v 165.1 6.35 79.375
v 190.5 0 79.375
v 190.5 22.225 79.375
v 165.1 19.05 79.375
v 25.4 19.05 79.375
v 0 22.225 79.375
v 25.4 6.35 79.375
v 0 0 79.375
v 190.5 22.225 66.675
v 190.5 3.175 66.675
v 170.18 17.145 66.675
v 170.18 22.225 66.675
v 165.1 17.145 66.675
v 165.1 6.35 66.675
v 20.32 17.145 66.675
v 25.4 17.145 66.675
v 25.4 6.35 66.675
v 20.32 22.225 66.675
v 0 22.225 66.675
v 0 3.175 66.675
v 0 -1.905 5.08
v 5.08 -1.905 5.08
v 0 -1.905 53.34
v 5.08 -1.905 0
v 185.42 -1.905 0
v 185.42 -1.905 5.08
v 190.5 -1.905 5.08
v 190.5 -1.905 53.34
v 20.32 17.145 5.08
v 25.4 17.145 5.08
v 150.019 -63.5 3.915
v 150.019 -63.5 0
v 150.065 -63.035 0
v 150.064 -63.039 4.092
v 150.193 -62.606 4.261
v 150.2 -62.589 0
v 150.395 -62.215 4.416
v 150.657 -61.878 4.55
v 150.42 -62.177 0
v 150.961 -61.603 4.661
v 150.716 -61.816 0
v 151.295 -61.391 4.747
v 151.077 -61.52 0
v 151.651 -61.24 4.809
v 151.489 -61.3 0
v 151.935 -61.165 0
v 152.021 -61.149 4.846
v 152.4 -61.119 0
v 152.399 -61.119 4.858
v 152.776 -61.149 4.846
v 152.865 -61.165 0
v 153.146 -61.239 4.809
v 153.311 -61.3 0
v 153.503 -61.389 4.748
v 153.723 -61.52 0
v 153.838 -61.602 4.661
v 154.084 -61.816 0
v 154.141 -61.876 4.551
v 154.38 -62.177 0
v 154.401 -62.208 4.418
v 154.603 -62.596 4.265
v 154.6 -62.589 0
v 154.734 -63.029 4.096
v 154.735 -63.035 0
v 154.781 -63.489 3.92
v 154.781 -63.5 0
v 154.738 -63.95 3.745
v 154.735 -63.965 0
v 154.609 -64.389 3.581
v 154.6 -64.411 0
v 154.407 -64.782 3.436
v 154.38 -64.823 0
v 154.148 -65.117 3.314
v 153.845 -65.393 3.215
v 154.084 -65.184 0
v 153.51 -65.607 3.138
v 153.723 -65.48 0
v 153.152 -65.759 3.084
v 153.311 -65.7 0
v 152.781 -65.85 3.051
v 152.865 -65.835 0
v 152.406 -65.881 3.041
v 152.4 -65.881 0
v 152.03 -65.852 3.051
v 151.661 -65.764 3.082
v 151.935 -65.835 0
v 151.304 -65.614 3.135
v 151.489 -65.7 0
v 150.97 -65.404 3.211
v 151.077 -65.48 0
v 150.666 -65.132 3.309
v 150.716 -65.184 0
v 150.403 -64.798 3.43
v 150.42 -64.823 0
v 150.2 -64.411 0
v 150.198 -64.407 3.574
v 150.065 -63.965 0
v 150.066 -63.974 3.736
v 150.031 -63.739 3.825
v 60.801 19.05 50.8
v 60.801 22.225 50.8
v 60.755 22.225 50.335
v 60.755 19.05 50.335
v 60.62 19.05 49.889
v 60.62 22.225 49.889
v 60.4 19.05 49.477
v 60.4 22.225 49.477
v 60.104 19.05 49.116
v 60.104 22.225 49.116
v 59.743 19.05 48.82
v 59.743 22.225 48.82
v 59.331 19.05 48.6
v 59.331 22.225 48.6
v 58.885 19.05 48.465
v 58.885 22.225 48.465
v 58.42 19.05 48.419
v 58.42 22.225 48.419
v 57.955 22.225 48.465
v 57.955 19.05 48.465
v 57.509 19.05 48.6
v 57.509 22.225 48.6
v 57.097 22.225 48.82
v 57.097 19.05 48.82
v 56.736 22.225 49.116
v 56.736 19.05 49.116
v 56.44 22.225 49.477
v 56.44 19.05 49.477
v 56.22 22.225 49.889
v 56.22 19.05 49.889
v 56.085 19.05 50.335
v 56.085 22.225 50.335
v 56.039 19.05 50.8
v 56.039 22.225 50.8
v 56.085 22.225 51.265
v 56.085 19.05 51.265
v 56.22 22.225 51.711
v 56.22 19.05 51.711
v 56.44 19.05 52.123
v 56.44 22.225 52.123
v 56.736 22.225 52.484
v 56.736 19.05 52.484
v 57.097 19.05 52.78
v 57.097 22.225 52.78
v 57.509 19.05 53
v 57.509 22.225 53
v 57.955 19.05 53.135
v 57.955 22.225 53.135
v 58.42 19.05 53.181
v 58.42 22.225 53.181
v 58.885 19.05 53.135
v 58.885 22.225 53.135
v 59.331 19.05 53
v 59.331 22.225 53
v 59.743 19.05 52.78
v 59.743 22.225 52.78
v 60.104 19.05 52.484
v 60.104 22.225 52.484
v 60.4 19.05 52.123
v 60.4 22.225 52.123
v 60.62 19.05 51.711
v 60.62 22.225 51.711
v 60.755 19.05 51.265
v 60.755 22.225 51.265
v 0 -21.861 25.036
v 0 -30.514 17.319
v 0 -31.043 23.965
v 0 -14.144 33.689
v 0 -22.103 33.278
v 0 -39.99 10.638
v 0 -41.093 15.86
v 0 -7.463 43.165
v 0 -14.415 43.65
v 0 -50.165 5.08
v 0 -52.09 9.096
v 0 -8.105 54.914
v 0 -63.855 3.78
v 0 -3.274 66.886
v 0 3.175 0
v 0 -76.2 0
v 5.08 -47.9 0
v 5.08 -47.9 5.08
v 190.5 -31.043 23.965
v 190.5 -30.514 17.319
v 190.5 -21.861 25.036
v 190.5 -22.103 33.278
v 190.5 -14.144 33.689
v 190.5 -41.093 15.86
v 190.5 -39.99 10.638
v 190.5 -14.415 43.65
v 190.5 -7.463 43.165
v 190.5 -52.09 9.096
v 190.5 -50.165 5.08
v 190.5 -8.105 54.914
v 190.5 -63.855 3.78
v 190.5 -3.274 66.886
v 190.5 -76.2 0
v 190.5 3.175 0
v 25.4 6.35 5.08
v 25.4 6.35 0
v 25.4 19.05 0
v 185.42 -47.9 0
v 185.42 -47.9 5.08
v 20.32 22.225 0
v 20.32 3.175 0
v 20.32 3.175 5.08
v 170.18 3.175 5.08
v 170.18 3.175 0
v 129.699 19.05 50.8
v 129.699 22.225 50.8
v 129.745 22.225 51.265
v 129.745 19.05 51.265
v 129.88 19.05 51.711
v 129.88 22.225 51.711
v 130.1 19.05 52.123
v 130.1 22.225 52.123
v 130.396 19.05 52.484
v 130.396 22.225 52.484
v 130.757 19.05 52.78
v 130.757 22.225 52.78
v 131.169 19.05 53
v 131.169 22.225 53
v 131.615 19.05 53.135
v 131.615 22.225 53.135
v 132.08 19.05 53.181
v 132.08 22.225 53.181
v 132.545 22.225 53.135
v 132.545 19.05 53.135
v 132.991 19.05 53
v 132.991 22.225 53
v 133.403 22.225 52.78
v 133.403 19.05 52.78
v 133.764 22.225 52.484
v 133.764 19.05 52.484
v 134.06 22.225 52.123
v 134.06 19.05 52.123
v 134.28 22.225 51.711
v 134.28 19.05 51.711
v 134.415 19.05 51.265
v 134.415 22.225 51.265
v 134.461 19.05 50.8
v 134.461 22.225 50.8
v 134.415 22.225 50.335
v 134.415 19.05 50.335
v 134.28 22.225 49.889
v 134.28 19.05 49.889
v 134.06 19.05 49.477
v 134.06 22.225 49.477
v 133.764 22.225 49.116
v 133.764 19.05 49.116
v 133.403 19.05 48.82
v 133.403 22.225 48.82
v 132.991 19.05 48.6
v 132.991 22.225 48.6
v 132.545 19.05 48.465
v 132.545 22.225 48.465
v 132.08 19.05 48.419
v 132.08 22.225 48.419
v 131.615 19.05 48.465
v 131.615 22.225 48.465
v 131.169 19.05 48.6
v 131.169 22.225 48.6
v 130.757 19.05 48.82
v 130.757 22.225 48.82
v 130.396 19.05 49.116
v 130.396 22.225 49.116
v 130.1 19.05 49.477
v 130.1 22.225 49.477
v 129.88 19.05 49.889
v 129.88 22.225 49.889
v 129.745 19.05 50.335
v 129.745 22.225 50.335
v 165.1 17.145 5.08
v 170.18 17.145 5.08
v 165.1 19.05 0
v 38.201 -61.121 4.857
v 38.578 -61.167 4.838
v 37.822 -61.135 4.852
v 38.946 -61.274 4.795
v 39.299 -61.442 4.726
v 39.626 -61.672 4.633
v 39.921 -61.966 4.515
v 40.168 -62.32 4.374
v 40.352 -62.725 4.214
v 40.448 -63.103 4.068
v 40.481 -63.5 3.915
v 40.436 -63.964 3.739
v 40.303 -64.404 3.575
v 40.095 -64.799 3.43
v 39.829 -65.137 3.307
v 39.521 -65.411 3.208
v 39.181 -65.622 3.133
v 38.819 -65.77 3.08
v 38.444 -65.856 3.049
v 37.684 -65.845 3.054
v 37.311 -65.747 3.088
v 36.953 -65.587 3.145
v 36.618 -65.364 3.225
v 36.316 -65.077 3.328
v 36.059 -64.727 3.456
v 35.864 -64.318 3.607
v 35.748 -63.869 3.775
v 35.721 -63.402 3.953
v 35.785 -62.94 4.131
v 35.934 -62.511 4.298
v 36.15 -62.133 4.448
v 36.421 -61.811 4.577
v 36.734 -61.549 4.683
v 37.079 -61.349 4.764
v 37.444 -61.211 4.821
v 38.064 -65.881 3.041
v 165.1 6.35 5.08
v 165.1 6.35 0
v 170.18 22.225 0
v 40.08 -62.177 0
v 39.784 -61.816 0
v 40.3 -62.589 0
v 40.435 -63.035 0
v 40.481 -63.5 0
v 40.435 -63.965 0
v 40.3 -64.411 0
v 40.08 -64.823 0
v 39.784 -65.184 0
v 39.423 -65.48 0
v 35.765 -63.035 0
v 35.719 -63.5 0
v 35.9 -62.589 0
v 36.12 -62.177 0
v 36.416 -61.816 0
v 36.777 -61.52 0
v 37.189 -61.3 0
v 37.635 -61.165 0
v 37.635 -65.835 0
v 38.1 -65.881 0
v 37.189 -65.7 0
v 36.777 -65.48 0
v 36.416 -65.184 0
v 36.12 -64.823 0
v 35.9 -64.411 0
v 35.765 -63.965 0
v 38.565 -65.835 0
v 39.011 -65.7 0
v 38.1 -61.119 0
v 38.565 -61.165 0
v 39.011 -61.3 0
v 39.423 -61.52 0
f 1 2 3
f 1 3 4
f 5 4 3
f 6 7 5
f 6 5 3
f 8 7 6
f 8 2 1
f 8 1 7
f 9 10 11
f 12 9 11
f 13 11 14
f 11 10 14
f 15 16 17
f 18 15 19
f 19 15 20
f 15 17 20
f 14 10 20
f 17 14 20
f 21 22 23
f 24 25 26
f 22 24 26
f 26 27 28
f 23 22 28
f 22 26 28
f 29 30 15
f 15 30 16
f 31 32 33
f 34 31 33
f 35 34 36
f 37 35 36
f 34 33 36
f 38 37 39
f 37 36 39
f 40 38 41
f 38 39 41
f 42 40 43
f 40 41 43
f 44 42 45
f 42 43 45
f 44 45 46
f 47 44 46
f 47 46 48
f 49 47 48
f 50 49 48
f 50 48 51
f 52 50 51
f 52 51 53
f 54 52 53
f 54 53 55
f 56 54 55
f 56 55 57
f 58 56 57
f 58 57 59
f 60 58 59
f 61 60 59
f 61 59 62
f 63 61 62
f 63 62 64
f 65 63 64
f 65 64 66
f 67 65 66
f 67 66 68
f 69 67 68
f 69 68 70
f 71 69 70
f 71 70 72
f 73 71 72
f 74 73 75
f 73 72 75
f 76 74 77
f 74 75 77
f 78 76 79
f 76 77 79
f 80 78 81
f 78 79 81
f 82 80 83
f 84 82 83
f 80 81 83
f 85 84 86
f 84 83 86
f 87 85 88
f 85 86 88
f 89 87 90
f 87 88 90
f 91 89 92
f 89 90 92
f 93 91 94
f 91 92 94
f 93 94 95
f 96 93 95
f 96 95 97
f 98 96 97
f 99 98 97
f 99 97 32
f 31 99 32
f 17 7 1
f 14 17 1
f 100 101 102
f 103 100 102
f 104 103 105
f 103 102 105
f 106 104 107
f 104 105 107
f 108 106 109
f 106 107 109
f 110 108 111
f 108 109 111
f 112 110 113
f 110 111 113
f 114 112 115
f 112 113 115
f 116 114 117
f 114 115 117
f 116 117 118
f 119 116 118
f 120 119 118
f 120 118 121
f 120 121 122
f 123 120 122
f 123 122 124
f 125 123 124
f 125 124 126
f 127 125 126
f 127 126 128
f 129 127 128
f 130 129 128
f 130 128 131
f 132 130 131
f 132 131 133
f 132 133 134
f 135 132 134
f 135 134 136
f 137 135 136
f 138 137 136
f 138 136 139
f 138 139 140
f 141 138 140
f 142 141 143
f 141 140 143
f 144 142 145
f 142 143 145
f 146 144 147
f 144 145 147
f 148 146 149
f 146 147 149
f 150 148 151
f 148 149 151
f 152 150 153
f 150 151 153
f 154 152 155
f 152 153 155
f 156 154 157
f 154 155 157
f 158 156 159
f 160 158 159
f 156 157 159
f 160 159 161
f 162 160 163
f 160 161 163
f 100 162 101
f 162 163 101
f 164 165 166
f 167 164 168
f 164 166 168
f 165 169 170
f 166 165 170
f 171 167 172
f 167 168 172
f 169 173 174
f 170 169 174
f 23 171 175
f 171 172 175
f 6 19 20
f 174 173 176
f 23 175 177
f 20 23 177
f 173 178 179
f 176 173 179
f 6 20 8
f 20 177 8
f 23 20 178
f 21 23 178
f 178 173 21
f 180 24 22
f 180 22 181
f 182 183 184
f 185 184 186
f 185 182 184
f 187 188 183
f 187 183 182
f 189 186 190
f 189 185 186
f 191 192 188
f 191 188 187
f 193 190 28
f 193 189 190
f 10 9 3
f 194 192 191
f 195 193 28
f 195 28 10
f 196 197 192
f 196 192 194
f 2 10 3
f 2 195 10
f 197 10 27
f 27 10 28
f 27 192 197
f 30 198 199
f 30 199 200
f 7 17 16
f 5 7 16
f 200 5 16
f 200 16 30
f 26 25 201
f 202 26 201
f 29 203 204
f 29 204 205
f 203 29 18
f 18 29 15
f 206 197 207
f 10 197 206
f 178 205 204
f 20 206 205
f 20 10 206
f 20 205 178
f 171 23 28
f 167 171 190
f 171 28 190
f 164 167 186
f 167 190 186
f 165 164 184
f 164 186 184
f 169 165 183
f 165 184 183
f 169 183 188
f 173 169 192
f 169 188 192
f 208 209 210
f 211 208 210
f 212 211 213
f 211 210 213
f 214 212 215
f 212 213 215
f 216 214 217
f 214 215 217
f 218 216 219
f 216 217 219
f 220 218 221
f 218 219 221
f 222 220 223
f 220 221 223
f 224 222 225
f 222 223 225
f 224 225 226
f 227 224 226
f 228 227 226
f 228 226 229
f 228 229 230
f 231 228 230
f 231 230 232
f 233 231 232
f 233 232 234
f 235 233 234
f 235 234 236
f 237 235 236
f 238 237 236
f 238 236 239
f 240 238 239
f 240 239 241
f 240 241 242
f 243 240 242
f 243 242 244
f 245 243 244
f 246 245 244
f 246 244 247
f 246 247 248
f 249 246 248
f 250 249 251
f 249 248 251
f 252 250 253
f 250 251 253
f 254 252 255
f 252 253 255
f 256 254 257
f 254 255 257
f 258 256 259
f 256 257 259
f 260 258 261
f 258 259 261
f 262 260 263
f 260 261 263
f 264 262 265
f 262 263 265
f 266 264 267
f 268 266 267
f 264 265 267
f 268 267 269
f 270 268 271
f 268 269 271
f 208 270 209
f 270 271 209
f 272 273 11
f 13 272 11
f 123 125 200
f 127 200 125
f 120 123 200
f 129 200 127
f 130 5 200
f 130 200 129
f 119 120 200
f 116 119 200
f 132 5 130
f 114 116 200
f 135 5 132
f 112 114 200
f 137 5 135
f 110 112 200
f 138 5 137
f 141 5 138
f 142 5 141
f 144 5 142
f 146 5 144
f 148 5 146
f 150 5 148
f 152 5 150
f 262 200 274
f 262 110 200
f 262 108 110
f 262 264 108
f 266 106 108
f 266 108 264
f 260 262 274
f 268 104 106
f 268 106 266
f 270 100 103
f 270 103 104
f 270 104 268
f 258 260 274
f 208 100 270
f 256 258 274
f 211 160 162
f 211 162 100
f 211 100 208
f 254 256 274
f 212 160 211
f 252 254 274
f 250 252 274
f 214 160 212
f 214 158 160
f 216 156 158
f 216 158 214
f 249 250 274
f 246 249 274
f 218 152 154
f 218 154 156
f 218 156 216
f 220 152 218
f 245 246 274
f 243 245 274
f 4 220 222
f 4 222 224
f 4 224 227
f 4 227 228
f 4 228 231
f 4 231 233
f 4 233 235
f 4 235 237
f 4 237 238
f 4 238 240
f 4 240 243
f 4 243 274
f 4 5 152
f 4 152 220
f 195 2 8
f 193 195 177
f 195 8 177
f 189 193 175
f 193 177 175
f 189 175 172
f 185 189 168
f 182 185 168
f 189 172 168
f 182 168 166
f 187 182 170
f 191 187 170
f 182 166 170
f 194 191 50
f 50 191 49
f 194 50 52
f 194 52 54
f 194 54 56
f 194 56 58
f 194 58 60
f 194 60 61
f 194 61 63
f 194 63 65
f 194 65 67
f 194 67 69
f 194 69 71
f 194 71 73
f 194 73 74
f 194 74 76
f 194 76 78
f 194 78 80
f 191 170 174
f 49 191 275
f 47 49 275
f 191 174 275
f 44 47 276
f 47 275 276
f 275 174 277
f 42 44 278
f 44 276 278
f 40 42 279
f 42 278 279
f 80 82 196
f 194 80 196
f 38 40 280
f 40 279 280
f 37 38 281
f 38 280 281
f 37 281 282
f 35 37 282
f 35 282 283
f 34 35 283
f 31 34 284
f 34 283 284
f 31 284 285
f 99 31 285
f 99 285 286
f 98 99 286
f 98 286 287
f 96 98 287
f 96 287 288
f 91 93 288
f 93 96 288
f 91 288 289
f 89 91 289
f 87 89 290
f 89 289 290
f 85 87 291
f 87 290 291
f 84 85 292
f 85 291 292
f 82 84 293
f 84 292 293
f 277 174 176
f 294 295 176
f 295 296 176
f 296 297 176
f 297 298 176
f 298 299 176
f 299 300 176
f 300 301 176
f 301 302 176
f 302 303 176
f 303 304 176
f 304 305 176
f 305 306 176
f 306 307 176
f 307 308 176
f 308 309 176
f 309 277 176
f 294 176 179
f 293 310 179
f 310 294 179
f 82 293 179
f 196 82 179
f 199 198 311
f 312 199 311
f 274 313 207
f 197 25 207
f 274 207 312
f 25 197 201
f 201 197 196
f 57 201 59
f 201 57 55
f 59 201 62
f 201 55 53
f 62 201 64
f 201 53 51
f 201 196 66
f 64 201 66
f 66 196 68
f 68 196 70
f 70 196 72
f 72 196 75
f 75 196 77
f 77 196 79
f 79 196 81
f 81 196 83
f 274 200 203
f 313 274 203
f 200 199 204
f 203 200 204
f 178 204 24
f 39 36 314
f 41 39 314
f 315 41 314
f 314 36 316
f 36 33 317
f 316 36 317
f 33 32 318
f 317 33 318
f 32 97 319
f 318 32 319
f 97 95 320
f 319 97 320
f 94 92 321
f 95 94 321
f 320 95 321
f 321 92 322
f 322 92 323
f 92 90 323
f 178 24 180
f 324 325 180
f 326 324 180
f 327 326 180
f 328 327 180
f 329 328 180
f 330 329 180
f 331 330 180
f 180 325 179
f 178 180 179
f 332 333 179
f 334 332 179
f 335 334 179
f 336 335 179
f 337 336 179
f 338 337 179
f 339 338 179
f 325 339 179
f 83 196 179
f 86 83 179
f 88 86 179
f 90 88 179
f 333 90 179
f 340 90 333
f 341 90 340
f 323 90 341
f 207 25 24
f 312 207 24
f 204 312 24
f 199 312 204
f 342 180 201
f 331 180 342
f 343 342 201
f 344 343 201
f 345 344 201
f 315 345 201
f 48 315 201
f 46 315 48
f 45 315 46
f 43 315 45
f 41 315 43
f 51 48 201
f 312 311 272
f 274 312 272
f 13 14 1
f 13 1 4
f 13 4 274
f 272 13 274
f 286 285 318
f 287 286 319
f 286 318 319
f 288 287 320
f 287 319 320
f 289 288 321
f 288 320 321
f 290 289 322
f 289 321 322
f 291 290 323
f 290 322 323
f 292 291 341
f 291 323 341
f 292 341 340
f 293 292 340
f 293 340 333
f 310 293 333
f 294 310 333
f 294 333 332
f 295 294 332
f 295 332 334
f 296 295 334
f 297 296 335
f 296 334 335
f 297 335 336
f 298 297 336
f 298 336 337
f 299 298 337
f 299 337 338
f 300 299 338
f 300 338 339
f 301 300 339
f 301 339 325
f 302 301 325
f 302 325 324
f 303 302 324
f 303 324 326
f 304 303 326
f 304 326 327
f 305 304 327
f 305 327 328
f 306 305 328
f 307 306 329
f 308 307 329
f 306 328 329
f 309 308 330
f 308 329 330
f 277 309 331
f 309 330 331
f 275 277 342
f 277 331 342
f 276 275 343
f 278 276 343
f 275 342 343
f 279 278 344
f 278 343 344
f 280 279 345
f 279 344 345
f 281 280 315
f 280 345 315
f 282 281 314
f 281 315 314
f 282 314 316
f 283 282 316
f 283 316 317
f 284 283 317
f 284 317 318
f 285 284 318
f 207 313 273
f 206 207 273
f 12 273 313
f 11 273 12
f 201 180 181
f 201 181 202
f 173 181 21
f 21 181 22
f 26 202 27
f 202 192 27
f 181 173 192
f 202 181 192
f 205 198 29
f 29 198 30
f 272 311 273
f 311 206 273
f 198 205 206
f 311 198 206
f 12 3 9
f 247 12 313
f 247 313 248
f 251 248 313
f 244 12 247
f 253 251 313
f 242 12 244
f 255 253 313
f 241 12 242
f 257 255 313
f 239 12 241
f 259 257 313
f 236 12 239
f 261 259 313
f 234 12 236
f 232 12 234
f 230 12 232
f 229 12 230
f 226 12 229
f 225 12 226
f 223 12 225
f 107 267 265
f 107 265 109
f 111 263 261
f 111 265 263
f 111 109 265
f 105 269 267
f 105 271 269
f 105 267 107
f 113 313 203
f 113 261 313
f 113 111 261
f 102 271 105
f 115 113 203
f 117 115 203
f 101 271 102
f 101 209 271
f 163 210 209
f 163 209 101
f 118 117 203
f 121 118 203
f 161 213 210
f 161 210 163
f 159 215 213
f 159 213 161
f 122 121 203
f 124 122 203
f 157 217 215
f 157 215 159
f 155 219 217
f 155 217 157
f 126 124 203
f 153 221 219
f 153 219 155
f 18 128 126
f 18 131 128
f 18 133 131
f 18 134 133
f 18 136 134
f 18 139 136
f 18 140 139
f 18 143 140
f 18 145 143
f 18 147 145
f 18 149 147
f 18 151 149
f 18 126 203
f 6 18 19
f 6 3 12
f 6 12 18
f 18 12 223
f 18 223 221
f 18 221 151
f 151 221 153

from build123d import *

# Parameters (mm, degrees)
F1_DEPTH  = 190.5
F2_W      = 190.5
F2_H      = 79.375
F3_DEPTH  = 3.175
F4_W      = 149.86
F4_H      = 79.375
F5_DEPTH  = 19.05
F6_W      = 139.7
F6_H      = 12.7
F7_DEPTH  = 127
F8_R      = 2.38125
F9_DEPTH  = 12.7
F10_R     = 2.38125
F11_DEPTH = 25.4
F12_W     = 20.32
F12_H     = 12.7
F13_DEPTH = 19.05
F14_W     = 20.32
F14_H     = 12.7
F15_DEPTH = 19.05
F17_DEPTH = 203.2
F18_W     = 13.97
F18_H     = 61.595
F19_DEPTH = 254
F20_W     = 180.34
F20_H     = 45.9946300644
F21_DEPTH = 5.08


with BuildPart() as f1:
    # F0 (on Right) → F1 (new body)
    with BuildSketch(Plane.YZ):
        with BuildLine():
            Line((-76.2, 0), (0, 0))
            Line((0, 0), (0, 79.375))
            ThreePointArc((0, 79.375), (-26.424895677, 28.4793998499), (-76.2, 0))
        make_face()
    extrude(amount=F1_DEPTH)

    # F2 (on face) → F3 (join)
    with BuildSketch(Plane(origin=(0, 0, 0), x_dir=(-1, 0, 0), z_dir=(0, 1, 0))):
        with Locations((-95.25, 39.6875)):
            Rectangle(F2_W, F2_H)
    extrude(amount=F3_DEPTH)

    # F4 (on face) → F5 (join)
    with BuildSketch(Plane(origin=(0, 3.175, 0), x_dir=(-1, 0, 0), z_dir=(0, 1, 0))):
        with Locations((-95.25, 39.6875)):
            Rectangle(F4_W, F4_H)
    extrude(amount=F5_DEPTH)

    # F6 (on face) → F7 (cut)
    with BuildSketch(Plane.XY.offset(79.375)):
        with Locations((95.25, 12.7)):
            Rectangle(F6_W, F6_H)
    extrude(amount=-F7_DEPTH, mode=Mode.SUBTRACT)

    # F8 (on face) → F9 (cut)
    with BuildSketch(Plane(origin=(0, 22.225, 0), x_dir=(-1, 0, 0), z_dir=(0, 1, 0))):
        with Locations((-132.08, 50.8)):
            Circle(F8_R)
        with BuildLine():
            ThreePointArc((-56.03875, 50.8), (-58.42, 53.18125), (-60.80125, 50.8))
            ThreePointArc((-60.80125, 50.8), (-58.42, 48.41875), (-56.03875, 50.8))
        make_face()
    extrude(amount=-F9_DEPTH, mode=Mode.SUBTRACT)

    # F10 (on face) → F11 (cut)
    with BuildSketch(Plane(origin=(0, 0, 0), x_dir=(1, 0, 0), z_dir=(0, 0, -1))):
        with BuildLine():
            ThreePointArc((154.78125, 63.5), (152.4, 65.88125), (150.01875, 63.5))
            ThreePointArc((150.01875, 63.5), (152.4, 61.11875), (154.78125, 63.5))
        make_face()
        with Locations((38.1, 63.5)):
            Circle(F10_R)
    extrude(amount=-F11_DEPTH, mode=Mode.SUBTRACT)

    # F12 (on face) → F13 (join)
    with BuildSketch(Plane(origin=(0, 3.175, 0), x_dir=(-1, 0, 0), z_dir=(0, 1, 0))):
        with Locations((-180.34, 73.025)):
            Rectangle(F12_W, F12_H)
    extrude(amount=F13_DEPTH)

    # F14 (on face) → F15 (join)
    with BuildSketch(Plane(origin=(0, 3.175, 0), x_dir=(-1, 0, 0), z_dir=(0, 1, 0))):
        with Locations((-10.16, 73.025)):
            Rectangle(F14_W, F14_H)
    extrude(amount=F15_DEPTH)

    # F16 (on face) → F17 (cut)
    with BuildSketch(Plane.YZ.offset(190.5)):
        with BuildLine():
            ThreePointArc((-1.905, 53.34), (-21.8614303996, 25.0364303996), (-50.165, 5.08))
            Line((-50.165, 5.08), (-1.905, 5.08))
            Line((-1.905, 5.08), (-1.905, 53.34))
        make_face()
    extrude(amount=-F17_DEPTH, mode=Mode.SUBTRACT)

    # F18 (on face) → F19 (cut)
    with BuildSketch(Plane.YZ.offset(170.18)):
        with Locations((10.16, 35.8775)):
            Rectangle(F18_W, F18_H)
    extrude(amount=-F19_DEPTH, mode=Mode.SUBTRACT)

    # F20 (on face) → F21 (cut)
    with BuildSketch(Plane(origin=(0, 0, 0), x_dir=(1, 0, 0), z_dir=(0, 0, -1))):
        with Locations((95.25, 24.9023150322)):
            Rectangle(F20_W, F20_H)
    extrude(amount=-F21_DEPTH, mode=Mode.SUBTRACT)


solid = f1.part
